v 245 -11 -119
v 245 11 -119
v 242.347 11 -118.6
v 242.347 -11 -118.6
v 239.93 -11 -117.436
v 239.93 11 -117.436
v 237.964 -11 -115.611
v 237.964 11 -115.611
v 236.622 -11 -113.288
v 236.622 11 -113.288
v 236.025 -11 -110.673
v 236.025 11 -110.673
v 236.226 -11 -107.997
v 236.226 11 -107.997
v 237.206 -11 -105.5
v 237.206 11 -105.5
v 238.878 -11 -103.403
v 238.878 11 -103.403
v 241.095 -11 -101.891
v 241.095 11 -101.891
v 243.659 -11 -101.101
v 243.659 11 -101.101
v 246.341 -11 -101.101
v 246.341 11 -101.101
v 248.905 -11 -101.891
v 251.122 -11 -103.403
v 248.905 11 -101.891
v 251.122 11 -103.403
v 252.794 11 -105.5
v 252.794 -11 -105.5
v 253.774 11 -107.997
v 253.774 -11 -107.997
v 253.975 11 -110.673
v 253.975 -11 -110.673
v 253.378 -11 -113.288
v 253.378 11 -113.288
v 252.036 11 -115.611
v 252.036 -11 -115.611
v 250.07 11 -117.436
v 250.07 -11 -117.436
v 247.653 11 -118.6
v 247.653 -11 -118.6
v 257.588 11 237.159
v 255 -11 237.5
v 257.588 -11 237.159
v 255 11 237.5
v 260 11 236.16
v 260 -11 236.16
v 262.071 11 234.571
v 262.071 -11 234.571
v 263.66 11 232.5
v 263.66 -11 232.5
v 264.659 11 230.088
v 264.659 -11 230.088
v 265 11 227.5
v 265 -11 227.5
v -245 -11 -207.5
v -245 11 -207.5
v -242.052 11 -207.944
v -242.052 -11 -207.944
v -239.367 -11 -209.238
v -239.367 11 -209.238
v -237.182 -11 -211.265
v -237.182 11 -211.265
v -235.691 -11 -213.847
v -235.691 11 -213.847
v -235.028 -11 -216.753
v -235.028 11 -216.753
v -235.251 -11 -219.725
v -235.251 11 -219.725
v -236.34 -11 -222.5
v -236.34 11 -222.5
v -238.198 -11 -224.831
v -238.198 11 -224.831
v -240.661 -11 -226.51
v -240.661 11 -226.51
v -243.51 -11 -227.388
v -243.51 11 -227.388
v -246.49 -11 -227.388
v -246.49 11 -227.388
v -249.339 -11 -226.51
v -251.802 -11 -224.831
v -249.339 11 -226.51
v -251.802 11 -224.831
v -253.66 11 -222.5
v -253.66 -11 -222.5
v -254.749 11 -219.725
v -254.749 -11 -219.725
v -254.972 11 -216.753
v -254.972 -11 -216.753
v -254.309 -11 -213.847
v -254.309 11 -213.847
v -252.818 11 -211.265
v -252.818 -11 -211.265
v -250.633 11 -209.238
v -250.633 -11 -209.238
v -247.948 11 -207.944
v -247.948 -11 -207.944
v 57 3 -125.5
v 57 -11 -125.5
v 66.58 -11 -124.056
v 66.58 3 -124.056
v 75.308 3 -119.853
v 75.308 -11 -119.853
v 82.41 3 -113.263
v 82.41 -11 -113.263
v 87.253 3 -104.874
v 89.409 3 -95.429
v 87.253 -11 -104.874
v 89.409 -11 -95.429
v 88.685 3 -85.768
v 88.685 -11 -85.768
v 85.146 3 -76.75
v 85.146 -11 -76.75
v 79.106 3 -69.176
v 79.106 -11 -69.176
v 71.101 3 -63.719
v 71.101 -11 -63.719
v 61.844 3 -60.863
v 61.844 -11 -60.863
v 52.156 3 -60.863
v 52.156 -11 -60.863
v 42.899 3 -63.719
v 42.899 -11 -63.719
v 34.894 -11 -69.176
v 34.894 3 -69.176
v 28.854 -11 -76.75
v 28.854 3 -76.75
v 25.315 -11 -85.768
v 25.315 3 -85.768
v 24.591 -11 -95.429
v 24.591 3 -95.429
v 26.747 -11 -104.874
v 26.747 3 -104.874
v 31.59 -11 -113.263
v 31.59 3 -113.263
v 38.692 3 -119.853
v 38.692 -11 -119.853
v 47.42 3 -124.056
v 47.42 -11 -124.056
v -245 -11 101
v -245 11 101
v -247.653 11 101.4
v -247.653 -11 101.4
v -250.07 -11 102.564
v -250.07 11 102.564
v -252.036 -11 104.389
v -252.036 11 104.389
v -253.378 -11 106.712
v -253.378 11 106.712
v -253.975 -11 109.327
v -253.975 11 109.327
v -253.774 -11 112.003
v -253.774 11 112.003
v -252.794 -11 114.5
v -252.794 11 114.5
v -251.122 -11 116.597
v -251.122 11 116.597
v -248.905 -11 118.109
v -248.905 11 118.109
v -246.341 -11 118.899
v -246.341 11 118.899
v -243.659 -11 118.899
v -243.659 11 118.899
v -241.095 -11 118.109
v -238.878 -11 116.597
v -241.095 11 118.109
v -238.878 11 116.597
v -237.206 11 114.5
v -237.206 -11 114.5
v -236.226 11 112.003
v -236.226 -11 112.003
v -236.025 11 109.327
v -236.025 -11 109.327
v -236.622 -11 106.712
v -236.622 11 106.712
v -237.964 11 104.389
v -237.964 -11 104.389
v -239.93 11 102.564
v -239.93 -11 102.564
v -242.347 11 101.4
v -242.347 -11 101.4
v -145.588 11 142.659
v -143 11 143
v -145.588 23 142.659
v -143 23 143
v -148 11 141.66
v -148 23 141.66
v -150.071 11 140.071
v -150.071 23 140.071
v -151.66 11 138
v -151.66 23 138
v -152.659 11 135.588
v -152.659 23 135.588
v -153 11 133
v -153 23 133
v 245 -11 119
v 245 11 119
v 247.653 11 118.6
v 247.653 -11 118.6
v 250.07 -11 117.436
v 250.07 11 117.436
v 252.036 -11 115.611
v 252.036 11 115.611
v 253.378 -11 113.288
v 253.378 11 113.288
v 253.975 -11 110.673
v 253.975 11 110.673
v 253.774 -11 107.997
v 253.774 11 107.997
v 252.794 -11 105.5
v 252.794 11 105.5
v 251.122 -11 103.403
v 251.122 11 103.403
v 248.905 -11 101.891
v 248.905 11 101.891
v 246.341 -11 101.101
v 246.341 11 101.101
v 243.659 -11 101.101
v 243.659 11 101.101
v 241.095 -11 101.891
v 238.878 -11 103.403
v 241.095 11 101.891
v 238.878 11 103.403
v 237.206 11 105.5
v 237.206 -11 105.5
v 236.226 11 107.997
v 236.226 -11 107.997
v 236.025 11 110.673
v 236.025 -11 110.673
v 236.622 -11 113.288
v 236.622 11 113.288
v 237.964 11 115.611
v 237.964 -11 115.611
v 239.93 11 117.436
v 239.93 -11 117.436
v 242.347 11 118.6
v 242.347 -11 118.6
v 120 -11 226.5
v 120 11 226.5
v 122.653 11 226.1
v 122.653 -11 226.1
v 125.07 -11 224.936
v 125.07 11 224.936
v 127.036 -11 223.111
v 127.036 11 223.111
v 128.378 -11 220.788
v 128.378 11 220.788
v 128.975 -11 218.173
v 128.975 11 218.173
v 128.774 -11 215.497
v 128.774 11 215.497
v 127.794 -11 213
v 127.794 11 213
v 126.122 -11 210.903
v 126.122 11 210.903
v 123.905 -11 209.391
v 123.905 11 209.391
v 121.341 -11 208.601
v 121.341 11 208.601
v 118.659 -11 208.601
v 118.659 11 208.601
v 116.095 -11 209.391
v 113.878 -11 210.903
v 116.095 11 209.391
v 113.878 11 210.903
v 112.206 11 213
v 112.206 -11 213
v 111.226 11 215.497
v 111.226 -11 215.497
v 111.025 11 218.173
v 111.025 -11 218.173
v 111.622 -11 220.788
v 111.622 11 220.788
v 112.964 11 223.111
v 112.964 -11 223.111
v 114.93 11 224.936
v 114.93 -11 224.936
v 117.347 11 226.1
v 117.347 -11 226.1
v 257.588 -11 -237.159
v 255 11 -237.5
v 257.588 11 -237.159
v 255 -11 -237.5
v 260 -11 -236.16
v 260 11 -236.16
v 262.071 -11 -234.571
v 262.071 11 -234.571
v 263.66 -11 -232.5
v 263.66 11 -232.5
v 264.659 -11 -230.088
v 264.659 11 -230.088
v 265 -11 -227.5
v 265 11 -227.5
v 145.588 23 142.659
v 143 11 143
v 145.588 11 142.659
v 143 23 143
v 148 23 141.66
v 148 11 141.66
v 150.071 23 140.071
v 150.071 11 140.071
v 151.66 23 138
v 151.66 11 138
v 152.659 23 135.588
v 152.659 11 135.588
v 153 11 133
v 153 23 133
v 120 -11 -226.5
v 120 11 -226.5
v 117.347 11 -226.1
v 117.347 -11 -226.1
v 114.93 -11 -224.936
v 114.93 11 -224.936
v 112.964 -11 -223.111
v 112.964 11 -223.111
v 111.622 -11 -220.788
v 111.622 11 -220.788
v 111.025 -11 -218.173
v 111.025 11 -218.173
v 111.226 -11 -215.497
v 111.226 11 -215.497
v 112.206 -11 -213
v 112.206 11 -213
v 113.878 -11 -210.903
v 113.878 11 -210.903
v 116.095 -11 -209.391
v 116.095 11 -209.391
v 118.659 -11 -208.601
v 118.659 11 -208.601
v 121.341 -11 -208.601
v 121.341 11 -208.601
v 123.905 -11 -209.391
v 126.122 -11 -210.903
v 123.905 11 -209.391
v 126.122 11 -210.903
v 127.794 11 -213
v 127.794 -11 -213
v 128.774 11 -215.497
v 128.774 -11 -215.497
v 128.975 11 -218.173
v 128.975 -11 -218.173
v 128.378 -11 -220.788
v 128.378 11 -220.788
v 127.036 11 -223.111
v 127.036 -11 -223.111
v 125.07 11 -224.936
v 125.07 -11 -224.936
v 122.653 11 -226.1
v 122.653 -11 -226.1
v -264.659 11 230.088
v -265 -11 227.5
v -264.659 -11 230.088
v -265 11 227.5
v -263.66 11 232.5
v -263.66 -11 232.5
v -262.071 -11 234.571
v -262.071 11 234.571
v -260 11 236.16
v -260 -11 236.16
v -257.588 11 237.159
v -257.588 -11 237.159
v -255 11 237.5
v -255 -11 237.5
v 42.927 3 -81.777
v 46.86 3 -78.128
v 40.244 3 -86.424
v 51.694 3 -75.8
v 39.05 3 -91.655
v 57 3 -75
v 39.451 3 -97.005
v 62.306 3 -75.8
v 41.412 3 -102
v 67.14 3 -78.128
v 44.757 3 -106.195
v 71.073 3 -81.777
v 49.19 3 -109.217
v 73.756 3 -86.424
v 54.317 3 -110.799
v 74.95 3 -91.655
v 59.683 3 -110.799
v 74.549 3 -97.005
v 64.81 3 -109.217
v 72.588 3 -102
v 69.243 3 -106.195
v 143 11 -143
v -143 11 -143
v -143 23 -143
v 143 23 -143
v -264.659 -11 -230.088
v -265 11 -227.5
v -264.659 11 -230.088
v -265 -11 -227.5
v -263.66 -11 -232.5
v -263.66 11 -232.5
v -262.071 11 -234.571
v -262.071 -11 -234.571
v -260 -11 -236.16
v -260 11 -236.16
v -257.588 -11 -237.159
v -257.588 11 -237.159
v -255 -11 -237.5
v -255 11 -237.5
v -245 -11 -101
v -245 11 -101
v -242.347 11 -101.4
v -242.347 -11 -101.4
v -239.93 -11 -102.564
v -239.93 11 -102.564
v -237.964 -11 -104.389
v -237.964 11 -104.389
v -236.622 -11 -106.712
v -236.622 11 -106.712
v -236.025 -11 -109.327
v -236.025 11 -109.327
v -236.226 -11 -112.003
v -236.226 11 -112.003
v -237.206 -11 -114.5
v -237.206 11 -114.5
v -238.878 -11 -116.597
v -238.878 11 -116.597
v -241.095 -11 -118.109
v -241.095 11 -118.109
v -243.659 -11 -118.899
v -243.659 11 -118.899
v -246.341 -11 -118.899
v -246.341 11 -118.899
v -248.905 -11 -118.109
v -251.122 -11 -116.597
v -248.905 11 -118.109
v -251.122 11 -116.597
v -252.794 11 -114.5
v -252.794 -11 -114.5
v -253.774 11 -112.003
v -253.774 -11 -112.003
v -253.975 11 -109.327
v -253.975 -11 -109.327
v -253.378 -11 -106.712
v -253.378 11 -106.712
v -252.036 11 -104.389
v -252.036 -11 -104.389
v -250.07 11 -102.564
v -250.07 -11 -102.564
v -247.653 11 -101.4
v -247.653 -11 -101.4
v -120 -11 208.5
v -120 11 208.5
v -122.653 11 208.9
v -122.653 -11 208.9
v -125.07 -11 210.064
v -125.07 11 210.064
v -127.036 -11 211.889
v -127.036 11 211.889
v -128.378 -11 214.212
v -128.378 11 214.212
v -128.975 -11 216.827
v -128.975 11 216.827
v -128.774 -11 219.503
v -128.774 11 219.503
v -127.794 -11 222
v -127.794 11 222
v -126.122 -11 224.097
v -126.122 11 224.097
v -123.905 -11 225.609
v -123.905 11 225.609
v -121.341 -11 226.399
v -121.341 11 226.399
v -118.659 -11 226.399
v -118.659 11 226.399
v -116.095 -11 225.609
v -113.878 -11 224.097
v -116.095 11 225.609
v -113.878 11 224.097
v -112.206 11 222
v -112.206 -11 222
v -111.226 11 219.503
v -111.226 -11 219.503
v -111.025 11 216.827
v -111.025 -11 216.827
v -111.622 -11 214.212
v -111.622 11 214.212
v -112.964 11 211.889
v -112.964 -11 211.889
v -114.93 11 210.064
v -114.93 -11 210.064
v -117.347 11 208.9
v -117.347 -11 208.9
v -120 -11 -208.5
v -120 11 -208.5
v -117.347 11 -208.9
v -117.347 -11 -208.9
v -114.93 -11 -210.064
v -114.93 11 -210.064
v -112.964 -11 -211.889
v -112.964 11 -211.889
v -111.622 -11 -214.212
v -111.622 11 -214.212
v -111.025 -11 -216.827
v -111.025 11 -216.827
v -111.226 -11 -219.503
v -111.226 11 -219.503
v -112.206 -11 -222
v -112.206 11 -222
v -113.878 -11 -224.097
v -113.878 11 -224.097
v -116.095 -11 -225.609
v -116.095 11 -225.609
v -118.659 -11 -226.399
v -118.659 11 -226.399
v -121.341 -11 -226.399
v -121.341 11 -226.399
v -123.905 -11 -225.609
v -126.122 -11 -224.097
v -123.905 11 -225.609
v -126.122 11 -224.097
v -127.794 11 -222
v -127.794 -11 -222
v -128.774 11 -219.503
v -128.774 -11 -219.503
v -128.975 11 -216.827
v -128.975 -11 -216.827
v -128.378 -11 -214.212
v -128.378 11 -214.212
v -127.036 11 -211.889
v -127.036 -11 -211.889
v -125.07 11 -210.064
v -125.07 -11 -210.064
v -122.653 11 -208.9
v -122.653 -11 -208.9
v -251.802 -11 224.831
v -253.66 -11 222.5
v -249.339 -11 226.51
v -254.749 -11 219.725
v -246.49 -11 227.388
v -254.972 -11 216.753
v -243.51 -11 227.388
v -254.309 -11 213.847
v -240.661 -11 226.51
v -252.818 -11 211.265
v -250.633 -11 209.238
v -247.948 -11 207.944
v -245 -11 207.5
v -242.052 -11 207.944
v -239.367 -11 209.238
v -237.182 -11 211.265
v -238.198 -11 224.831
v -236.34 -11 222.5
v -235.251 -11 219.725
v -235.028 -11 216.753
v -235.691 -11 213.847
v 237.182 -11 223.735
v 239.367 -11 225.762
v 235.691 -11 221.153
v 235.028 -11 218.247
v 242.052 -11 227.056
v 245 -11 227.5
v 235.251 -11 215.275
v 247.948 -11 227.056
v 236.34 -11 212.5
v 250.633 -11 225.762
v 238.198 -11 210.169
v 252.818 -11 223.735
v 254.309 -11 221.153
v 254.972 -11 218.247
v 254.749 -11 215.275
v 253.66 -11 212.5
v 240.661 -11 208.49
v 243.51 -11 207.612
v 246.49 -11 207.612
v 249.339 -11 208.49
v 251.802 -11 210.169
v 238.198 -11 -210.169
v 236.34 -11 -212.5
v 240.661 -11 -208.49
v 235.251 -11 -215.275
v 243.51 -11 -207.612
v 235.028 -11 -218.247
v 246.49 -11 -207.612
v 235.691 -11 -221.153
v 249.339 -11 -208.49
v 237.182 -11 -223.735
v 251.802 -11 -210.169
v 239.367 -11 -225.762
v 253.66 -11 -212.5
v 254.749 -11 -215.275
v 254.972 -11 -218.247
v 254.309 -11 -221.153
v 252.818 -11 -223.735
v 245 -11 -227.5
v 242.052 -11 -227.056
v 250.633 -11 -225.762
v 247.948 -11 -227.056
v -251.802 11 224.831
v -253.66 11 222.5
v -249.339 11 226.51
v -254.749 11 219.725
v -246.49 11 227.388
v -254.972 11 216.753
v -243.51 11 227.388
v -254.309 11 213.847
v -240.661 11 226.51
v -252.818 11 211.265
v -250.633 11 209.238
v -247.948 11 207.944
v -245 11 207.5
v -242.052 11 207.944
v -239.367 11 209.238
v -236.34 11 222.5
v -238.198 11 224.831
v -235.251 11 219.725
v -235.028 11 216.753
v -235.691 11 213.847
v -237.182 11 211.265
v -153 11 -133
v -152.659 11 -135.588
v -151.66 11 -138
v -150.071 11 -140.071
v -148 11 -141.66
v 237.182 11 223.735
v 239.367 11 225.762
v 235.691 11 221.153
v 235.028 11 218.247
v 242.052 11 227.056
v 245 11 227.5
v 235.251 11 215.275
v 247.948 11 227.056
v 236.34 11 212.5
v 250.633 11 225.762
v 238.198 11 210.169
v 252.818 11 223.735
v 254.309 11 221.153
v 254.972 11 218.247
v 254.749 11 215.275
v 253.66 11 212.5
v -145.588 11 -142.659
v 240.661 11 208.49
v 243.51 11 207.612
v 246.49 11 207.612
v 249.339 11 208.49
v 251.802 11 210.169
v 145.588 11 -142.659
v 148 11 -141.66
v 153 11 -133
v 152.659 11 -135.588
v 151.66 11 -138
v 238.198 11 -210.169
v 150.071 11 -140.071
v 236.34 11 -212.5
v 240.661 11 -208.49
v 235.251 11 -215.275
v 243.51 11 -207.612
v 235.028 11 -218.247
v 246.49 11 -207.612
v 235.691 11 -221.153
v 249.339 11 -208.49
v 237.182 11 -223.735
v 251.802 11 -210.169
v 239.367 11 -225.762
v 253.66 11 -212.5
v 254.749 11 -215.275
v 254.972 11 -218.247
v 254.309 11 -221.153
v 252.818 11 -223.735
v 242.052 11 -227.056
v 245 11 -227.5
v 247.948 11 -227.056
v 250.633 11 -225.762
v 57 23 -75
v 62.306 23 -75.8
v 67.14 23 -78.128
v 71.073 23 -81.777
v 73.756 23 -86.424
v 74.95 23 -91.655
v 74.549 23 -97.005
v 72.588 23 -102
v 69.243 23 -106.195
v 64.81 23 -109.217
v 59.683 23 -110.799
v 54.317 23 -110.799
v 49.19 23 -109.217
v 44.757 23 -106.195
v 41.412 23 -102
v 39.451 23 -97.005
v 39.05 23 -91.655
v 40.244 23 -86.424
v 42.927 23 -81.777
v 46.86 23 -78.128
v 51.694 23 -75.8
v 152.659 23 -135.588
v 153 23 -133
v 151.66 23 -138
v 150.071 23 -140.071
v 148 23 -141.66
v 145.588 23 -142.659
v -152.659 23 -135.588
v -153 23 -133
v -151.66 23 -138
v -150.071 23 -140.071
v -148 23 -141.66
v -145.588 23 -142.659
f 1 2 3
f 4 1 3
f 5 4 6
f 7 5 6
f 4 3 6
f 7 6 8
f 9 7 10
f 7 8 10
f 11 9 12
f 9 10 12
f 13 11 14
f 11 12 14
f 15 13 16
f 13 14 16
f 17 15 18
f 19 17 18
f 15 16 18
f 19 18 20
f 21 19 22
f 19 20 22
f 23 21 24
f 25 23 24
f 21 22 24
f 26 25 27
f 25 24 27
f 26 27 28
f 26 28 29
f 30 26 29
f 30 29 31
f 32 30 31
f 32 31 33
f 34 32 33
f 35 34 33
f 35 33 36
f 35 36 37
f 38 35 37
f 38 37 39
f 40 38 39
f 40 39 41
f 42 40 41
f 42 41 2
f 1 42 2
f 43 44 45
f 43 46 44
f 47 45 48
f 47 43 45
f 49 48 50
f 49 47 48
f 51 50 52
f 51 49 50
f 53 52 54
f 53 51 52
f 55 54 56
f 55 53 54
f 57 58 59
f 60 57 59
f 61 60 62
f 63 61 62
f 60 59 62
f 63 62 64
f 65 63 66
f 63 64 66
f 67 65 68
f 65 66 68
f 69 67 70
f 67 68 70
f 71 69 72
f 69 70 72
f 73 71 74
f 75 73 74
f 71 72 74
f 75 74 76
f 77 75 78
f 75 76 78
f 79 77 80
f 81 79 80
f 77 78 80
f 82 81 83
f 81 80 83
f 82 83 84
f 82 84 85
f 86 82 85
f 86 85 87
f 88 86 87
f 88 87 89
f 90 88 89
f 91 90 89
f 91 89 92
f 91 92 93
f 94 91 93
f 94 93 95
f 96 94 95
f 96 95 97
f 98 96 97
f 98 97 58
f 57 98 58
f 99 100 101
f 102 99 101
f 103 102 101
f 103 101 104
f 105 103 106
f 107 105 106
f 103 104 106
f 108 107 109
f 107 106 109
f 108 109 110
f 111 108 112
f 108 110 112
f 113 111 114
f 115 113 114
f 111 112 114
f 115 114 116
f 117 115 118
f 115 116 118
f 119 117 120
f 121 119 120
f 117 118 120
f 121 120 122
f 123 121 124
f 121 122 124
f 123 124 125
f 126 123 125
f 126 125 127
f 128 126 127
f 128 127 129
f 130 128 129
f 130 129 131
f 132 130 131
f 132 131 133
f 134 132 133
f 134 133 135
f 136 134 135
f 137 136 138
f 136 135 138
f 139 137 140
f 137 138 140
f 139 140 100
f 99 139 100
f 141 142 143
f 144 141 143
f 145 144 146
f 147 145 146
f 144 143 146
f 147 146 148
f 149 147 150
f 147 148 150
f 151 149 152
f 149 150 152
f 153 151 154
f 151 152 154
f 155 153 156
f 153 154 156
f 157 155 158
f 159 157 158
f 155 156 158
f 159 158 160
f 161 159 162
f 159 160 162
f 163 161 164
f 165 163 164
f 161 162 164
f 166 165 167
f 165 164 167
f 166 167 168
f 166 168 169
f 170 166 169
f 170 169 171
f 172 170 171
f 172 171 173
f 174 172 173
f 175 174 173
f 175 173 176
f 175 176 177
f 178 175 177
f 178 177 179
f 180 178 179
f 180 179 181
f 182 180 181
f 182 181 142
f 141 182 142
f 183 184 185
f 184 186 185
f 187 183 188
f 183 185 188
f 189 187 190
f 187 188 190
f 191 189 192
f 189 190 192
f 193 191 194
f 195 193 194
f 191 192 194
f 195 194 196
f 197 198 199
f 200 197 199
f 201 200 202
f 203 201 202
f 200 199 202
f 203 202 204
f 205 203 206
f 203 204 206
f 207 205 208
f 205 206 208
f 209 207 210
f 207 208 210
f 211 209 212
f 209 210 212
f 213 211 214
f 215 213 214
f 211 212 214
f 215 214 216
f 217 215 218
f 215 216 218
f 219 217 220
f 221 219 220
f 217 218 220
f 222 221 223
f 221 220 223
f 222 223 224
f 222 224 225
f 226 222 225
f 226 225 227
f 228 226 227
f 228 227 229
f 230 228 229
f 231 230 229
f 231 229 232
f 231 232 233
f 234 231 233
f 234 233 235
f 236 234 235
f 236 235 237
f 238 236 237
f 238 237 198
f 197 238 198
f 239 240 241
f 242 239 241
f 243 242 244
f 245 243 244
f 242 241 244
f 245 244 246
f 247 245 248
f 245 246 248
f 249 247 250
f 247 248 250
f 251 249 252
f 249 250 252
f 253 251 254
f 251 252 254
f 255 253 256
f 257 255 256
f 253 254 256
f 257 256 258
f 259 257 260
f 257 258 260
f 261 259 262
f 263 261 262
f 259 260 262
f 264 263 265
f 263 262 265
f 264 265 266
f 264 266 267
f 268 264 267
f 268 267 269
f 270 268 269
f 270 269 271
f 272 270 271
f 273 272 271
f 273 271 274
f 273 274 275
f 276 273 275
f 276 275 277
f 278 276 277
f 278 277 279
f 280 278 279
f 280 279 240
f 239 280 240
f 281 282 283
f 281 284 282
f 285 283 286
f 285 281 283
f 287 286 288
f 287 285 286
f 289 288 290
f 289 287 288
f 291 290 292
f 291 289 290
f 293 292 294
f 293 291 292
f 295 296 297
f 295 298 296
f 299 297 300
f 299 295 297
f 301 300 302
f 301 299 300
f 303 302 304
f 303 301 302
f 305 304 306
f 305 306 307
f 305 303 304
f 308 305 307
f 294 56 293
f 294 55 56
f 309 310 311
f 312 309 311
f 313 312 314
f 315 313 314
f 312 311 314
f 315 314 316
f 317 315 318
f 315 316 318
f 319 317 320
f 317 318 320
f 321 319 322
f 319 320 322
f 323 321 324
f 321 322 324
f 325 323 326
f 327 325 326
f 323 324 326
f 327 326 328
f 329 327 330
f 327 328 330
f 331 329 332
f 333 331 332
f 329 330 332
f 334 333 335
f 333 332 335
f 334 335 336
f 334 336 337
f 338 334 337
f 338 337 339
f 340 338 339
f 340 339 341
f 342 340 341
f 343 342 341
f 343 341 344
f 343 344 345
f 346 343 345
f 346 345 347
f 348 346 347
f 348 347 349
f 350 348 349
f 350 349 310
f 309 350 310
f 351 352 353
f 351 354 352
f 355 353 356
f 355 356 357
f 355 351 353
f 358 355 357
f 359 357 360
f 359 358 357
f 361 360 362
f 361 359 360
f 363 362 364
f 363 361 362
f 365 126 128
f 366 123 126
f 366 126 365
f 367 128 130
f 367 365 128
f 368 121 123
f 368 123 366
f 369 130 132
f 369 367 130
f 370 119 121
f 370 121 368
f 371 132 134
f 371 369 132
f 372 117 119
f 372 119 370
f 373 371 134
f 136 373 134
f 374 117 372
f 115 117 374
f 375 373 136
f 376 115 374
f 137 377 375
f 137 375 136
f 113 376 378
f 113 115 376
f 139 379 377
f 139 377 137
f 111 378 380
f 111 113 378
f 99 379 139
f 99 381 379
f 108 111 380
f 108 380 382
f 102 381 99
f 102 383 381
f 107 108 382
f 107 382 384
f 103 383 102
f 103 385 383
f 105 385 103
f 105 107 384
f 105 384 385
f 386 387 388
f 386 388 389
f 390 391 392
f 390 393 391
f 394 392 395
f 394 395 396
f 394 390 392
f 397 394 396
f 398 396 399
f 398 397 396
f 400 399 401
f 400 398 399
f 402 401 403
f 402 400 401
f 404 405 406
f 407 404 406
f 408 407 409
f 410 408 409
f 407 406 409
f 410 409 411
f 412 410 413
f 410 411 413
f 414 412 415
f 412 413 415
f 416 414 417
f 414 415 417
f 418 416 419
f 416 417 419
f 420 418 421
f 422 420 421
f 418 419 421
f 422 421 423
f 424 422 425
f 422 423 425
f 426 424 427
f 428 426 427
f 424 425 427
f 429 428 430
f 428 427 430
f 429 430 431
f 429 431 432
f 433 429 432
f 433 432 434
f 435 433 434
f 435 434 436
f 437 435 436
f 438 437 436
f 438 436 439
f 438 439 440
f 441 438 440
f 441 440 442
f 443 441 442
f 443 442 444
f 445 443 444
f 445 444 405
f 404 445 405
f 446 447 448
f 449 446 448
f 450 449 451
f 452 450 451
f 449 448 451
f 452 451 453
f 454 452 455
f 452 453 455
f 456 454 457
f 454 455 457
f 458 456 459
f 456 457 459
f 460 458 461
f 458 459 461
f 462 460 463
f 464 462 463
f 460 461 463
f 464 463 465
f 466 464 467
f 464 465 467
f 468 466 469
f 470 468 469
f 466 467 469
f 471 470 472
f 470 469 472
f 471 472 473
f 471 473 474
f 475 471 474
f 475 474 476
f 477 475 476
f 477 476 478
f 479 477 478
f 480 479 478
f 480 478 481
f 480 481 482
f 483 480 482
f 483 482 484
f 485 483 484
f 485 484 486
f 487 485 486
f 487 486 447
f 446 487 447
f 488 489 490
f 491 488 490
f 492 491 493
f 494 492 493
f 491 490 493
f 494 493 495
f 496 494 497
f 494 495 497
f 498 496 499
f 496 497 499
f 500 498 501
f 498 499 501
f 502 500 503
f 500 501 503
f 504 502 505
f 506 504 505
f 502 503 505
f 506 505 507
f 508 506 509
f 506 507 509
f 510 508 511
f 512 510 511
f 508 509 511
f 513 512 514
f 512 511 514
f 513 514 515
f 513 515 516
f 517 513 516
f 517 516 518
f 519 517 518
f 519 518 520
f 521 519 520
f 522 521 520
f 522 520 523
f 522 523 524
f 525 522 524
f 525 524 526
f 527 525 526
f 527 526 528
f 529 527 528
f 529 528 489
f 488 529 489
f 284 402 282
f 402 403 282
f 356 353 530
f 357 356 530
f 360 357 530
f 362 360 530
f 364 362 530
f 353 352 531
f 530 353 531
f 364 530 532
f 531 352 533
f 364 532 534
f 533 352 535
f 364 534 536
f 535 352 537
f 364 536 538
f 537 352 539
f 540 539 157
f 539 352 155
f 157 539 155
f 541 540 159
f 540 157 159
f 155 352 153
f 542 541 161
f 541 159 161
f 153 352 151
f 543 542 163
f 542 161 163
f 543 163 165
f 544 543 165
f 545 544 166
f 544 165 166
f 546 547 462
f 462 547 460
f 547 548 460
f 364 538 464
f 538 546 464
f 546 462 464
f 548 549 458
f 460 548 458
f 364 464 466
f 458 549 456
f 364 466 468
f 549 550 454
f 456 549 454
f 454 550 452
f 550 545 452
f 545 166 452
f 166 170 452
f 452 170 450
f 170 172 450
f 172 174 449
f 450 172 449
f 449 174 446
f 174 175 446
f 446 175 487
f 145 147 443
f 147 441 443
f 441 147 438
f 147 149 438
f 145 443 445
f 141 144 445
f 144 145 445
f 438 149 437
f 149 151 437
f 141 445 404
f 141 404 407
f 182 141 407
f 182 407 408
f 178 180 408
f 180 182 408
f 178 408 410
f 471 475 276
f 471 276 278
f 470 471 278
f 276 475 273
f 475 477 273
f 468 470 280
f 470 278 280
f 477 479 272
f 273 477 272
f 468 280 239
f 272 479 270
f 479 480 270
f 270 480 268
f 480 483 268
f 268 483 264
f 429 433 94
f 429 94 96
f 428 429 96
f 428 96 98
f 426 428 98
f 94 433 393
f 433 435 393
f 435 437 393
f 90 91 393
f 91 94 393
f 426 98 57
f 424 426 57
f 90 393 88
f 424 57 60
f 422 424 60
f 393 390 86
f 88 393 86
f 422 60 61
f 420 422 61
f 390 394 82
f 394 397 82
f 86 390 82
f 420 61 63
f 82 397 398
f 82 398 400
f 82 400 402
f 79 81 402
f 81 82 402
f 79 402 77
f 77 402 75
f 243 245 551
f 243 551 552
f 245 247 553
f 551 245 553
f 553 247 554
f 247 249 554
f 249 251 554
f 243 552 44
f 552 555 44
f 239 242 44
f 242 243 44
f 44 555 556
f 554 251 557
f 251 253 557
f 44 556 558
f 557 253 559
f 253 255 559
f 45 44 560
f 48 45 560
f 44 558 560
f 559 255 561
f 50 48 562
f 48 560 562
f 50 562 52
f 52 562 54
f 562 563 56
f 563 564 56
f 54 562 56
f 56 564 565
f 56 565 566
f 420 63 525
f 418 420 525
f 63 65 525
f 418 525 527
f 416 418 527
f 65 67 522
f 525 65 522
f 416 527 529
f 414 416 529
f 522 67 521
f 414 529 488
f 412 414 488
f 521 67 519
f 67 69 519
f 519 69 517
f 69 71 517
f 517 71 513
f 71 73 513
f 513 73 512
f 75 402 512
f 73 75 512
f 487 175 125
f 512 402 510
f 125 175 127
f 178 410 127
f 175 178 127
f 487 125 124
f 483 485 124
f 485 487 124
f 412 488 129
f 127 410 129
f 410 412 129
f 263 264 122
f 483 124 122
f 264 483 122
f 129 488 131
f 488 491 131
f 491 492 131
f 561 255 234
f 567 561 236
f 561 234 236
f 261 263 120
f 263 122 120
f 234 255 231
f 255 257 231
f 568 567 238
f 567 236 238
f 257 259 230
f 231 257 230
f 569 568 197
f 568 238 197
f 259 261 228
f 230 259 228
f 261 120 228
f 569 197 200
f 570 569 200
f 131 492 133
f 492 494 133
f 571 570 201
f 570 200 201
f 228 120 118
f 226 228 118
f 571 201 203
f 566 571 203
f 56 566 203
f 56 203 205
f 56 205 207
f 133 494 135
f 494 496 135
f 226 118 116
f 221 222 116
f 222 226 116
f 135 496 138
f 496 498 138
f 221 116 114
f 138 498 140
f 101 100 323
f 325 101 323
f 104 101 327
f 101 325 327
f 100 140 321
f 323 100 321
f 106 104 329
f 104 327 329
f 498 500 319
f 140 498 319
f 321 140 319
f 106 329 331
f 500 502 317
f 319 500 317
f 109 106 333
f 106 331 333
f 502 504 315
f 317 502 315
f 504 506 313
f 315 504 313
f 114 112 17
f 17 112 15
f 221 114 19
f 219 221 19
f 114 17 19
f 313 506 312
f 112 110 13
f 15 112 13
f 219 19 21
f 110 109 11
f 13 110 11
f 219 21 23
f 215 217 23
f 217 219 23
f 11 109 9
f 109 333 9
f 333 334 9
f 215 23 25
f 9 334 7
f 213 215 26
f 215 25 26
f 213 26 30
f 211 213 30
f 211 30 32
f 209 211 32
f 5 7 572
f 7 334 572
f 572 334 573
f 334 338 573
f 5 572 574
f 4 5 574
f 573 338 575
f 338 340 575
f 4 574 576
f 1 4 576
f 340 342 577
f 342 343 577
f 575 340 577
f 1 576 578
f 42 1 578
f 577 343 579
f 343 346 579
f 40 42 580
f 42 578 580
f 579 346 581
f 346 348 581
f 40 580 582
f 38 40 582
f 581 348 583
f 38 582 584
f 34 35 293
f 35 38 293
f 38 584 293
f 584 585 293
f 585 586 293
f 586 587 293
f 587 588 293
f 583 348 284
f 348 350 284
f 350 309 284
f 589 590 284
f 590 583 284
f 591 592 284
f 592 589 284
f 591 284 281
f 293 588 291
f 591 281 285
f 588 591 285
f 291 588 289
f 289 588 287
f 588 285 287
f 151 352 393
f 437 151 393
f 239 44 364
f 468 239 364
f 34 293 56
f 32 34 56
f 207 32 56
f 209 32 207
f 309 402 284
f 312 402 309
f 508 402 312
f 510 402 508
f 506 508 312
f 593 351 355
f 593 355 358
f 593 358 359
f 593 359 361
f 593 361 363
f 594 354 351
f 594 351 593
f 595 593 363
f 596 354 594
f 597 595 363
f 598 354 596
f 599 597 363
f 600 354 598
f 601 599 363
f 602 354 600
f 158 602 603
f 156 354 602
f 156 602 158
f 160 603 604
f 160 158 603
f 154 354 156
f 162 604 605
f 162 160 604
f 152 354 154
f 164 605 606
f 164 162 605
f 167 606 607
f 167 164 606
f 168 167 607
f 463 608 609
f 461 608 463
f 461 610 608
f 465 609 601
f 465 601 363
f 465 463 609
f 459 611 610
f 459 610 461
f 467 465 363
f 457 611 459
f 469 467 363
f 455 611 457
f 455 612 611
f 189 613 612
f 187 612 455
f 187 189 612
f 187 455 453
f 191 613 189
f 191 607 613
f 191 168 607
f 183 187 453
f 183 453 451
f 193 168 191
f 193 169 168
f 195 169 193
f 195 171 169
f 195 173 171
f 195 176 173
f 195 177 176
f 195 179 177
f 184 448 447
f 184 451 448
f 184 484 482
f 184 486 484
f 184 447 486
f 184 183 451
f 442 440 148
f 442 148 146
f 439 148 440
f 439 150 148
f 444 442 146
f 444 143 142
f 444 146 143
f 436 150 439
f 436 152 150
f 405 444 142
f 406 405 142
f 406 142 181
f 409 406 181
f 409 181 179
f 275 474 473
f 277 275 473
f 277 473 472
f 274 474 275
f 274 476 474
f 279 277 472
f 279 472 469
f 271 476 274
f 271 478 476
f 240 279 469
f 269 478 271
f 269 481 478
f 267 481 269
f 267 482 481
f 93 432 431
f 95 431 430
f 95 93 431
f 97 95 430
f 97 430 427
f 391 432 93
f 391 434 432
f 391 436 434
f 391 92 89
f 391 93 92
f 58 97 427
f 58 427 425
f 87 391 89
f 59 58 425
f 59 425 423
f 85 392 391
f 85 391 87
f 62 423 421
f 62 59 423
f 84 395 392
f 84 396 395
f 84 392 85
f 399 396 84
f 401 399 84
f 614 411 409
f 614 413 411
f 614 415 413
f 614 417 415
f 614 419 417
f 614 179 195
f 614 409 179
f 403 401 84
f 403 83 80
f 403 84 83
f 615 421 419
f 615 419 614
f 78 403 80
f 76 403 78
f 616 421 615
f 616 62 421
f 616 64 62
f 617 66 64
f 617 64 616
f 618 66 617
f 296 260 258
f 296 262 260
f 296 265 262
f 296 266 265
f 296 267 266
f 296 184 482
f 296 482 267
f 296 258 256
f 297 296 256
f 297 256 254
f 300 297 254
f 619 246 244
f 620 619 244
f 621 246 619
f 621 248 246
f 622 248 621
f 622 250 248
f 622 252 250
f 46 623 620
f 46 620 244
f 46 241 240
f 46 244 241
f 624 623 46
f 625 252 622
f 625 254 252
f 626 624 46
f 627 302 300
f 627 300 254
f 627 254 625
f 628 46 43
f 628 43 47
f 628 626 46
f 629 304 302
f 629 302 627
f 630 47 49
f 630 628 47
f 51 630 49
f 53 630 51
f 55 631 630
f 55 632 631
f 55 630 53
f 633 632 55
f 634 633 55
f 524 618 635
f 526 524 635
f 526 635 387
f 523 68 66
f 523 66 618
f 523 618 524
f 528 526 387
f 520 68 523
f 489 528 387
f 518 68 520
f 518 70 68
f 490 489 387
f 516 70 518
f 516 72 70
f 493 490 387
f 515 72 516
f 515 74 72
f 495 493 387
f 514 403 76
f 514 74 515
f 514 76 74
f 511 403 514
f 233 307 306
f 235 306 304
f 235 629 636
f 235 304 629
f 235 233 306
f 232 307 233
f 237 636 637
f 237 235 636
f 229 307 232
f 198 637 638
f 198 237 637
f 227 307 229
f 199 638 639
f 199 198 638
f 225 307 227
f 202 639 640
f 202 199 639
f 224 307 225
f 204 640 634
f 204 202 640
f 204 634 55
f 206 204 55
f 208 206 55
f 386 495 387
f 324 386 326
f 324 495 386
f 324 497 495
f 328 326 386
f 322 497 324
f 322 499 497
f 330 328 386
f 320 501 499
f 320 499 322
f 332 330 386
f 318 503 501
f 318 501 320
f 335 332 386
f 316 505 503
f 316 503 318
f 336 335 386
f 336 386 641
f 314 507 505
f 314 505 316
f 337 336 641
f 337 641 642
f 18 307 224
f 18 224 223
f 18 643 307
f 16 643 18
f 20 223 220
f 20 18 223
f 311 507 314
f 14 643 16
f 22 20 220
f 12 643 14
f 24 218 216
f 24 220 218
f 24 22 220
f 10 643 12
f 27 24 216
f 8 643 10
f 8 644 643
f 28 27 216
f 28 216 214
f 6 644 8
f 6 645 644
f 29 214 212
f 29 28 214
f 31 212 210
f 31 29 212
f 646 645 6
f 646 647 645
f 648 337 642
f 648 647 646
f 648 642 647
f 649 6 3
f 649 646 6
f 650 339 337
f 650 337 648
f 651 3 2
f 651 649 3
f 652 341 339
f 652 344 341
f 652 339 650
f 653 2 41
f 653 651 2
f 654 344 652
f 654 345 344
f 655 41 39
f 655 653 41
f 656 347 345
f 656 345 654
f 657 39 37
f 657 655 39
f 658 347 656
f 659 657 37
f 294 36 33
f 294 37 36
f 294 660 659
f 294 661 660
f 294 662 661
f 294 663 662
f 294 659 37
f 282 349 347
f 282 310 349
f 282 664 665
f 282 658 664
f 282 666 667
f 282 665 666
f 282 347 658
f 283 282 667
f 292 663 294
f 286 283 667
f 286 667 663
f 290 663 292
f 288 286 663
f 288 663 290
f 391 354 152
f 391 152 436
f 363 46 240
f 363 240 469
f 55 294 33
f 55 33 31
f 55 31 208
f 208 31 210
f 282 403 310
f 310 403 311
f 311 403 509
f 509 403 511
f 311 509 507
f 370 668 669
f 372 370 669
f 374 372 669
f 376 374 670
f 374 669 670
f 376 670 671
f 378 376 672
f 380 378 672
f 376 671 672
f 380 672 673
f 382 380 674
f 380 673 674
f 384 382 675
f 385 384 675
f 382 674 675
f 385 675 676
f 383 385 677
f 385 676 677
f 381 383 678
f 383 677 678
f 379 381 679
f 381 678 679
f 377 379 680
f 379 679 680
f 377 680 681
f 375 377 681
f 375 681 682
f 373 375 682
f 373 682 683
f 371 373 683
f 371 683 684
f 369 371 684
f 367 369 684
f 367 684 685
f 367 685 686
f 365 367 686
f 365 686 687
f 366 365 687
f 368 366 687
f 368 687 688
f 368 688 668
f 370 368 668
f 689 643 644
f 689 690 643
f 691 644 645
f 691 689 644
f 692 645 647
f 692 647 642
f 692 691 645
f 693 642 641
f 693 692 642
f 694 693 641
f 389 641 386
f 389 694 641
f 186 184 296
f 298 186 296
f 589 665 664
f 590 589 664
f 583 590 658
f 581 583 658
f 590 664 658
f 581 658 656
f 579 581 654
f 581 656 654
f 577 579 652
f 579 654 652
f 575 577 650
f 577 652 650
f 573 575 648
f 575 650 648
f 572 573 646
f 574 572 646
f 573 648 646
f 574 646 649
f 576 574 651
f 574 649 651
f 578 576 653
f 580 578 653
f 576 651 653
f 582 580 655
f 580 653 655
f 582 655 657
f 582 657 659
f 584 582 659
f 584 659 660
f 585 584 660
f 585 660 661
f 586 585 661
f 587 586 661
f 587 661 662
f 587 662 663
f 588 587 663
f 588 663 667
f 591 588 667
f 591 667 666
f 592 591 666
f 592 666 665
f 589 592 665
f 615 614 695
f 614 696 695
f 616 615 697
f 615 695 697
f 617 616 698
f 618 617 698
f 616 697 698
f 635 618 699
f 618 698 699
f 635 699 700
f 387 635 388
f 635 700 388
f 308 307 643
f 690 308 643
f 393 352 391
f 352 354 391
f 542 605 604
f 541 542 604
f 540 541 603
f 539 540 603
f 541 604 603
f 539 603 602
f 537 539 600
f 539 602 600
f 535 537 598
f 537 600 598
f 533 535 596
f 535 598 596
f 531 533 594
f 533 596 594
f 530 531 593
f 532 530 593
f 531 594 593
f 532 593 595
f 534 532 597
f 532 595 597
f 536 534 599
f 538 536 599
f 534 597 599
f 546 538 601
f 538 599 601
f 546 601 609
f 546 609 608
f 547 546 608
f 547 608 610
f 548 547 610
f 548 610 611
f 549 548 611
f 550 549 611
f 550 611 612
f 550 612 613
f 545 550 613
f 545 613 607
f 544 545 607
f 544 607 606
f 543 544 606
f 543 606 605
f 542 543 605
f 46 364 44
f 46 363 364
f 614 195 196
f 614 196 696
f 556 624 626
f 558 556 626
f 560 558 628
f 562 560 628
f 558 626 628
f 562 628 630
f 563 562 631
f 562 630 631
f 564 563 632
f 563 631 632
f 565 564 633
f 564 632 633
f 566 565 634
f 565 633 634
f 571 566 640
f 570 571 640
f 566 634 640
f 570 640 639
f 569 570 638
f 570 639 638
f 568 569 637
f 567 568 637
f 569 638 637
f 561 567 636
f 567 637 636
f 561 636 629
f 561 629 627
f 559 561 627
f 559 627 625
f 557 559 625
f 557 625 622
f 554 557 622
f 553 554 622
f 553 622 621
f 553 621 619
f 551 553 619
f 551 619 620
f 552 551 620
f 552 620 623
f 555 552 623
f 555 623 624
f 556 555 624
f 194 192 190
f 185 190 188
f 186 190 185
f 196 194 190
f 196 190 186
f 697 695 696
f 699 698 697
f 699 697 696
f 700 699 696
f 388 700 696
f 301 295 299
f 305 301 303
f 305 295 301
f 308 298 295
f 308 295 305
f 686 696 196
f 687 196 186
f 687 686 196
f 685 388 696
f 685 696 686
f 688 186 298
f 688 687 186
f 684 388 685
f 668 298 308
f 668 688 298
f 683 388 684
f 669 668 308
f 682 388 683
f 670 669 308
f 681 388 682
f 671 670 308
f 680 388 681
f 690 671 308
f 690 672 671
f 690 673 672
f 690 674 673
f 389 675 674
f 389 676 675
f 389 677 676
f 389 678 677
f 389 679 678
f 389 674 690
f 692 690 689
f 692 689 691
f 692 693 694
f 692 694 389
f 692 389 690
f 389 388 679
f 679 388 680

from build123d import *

# Parameters (mm, degrees)
SKETCH1_W           = 530
SKETCH1_H           = 475
BOSS_EXTRUDE1_DEPTH = 11
SKETCH2_W           = 306
SKETCH2_H           = 286
BOSS_EXTRUDE2_DEPTH = 12
SKETCH3_R           = 10
SKETCH3_R_2         = 9
CUT_EXTRUDE1_DEPTH  = 357.532256605
SKETCH4_R           = 18
CUT_EXTRUDE2_DEPTH  = 358.473425586
SKETCH5_R           = 32.5
CUT_EXTRUDE3_DEPTH  = 14
FILLET1_R           = 10


with BuildPart() as part:
    # Sketch1 → Boss-Extrude1 (new, symmetric)
    with BuildSketch(Plane(origin=(0, 0, 0), x_dir=(1, 0, 0), z_dir=(0, 1, 0))):
        Rectangle(SKETCH1_W, SKETCH1_H)
    extrude(amount=BOSS_EXTRUDE1_DEPTH, both=True)

    # Sketch2 → Boss-Extrude2 (add)
    with BuildSketch(Plane(origin=(0, 11, 0), x_dir=(1, 0, 0), z_dir=(0, 1, 0))):
        Rectangle(SKETCH2_W, SKETCH2_H)
    extrude(amount=BOSS_EXTRUDE2_DEPTH)

    # Sketch3 → Cut-Extrude1 (cut, through all)
    with BuildSketch(Plane(origin=(0, 11, 0), x_dir=(1, 0, 0), z_dir=(0, 1, 0))):
        with Locations(Location((-245, 217.5, 0), (0, 0, 270))):
            Circle(SKETCH3_R)
        with Locations(Location((-120, 217.5, 0), (0, 0, 270))):
            Circle(SKETCH3_R_2)
        with Locations(Location((-245, 110, 0), (0, 0, 270))):
            Circle(SKETCH3_R_2)
        with Locations(Location((120, 217.5, 0), (0, 0, 90))):
            Circle(SKETCH3_R_2)
        with Locations(Location((245, 217.5, 0), (0, 0, 90))):
            Circle(SKETCH3_R)
        with Locations(Location((245, 110, 0), (0, 0, 90))):
            Circle(SKETCH3_R_2)
        with Locations(Location((245, -110, 0), (0, 0, 270))):
            Circle(SKETCH3_R_2)
        with Locations(Location((245, -217.5, 0), (0, 0, 270))):
            Circle(SKETCH3_R)
        with Locations(Location((120, -217.5, 0), (0, 0, 270))):
            Circle(SKETCH3_R_2)
        with Locations(Location((-120, -217.5, 0), (0, 0, 90))):
            Circle(SKETCH3_R_2)
        with Locations(Location((-245, -110, 0), (0, 0, 90))):
            Circle(SKETCH3_R_2)
        with Locations(Location((-245, -217.5, 0), (0, 0, 90))):
            Circle(SKETCH3_R)
    extrude(amount=-CUT_EXTRUDE1_DEPTH, mode=Mode.SUBTRACT)

    # Sketch4 → Cut-Extrude2 (cut, through all)
    with BuildSketch(Plane(origin=(0, 23, 0), x_dir=(1, 0, 0), z_dir=(0, 1, 0))):
        with Locations(Location((57, 93, 0), (0, 0, 270))):
            Circle(SKETCH4_R)
    extrude(amount=-CUT_EXTRUDE2_DEPTH, mode=Mode.SUBTRACT)

    # Sketch5 → Cut-Extrude3 (cut)
    with BuildSketch(Plane.XZ.offset(11)):
        with Locations(Location((57, -93, 0), (0, 0, 270))):
            Circle(SKETCH5_R)
    extrude(amount=-CUT_EXTRUDE3_DEPTH, mode=Mode.SUBTRACT)

    # Fillet1
    fillet1_edges = [part.edges().sort_by_distance(p)[0] for p in [
        (153, 17, 143),
        (153, 17, -143),
        (-153, 17, -143),
        (-153, 17, 143),
        (265, 0, 237.5),
        (-265, 0, 237.5),
        (-265, 0, -237.5),
        (265, 0, -237.5),
    ]]
    fillet(fillet1_edges, radius=FILLET1_R)


solid = part.part
